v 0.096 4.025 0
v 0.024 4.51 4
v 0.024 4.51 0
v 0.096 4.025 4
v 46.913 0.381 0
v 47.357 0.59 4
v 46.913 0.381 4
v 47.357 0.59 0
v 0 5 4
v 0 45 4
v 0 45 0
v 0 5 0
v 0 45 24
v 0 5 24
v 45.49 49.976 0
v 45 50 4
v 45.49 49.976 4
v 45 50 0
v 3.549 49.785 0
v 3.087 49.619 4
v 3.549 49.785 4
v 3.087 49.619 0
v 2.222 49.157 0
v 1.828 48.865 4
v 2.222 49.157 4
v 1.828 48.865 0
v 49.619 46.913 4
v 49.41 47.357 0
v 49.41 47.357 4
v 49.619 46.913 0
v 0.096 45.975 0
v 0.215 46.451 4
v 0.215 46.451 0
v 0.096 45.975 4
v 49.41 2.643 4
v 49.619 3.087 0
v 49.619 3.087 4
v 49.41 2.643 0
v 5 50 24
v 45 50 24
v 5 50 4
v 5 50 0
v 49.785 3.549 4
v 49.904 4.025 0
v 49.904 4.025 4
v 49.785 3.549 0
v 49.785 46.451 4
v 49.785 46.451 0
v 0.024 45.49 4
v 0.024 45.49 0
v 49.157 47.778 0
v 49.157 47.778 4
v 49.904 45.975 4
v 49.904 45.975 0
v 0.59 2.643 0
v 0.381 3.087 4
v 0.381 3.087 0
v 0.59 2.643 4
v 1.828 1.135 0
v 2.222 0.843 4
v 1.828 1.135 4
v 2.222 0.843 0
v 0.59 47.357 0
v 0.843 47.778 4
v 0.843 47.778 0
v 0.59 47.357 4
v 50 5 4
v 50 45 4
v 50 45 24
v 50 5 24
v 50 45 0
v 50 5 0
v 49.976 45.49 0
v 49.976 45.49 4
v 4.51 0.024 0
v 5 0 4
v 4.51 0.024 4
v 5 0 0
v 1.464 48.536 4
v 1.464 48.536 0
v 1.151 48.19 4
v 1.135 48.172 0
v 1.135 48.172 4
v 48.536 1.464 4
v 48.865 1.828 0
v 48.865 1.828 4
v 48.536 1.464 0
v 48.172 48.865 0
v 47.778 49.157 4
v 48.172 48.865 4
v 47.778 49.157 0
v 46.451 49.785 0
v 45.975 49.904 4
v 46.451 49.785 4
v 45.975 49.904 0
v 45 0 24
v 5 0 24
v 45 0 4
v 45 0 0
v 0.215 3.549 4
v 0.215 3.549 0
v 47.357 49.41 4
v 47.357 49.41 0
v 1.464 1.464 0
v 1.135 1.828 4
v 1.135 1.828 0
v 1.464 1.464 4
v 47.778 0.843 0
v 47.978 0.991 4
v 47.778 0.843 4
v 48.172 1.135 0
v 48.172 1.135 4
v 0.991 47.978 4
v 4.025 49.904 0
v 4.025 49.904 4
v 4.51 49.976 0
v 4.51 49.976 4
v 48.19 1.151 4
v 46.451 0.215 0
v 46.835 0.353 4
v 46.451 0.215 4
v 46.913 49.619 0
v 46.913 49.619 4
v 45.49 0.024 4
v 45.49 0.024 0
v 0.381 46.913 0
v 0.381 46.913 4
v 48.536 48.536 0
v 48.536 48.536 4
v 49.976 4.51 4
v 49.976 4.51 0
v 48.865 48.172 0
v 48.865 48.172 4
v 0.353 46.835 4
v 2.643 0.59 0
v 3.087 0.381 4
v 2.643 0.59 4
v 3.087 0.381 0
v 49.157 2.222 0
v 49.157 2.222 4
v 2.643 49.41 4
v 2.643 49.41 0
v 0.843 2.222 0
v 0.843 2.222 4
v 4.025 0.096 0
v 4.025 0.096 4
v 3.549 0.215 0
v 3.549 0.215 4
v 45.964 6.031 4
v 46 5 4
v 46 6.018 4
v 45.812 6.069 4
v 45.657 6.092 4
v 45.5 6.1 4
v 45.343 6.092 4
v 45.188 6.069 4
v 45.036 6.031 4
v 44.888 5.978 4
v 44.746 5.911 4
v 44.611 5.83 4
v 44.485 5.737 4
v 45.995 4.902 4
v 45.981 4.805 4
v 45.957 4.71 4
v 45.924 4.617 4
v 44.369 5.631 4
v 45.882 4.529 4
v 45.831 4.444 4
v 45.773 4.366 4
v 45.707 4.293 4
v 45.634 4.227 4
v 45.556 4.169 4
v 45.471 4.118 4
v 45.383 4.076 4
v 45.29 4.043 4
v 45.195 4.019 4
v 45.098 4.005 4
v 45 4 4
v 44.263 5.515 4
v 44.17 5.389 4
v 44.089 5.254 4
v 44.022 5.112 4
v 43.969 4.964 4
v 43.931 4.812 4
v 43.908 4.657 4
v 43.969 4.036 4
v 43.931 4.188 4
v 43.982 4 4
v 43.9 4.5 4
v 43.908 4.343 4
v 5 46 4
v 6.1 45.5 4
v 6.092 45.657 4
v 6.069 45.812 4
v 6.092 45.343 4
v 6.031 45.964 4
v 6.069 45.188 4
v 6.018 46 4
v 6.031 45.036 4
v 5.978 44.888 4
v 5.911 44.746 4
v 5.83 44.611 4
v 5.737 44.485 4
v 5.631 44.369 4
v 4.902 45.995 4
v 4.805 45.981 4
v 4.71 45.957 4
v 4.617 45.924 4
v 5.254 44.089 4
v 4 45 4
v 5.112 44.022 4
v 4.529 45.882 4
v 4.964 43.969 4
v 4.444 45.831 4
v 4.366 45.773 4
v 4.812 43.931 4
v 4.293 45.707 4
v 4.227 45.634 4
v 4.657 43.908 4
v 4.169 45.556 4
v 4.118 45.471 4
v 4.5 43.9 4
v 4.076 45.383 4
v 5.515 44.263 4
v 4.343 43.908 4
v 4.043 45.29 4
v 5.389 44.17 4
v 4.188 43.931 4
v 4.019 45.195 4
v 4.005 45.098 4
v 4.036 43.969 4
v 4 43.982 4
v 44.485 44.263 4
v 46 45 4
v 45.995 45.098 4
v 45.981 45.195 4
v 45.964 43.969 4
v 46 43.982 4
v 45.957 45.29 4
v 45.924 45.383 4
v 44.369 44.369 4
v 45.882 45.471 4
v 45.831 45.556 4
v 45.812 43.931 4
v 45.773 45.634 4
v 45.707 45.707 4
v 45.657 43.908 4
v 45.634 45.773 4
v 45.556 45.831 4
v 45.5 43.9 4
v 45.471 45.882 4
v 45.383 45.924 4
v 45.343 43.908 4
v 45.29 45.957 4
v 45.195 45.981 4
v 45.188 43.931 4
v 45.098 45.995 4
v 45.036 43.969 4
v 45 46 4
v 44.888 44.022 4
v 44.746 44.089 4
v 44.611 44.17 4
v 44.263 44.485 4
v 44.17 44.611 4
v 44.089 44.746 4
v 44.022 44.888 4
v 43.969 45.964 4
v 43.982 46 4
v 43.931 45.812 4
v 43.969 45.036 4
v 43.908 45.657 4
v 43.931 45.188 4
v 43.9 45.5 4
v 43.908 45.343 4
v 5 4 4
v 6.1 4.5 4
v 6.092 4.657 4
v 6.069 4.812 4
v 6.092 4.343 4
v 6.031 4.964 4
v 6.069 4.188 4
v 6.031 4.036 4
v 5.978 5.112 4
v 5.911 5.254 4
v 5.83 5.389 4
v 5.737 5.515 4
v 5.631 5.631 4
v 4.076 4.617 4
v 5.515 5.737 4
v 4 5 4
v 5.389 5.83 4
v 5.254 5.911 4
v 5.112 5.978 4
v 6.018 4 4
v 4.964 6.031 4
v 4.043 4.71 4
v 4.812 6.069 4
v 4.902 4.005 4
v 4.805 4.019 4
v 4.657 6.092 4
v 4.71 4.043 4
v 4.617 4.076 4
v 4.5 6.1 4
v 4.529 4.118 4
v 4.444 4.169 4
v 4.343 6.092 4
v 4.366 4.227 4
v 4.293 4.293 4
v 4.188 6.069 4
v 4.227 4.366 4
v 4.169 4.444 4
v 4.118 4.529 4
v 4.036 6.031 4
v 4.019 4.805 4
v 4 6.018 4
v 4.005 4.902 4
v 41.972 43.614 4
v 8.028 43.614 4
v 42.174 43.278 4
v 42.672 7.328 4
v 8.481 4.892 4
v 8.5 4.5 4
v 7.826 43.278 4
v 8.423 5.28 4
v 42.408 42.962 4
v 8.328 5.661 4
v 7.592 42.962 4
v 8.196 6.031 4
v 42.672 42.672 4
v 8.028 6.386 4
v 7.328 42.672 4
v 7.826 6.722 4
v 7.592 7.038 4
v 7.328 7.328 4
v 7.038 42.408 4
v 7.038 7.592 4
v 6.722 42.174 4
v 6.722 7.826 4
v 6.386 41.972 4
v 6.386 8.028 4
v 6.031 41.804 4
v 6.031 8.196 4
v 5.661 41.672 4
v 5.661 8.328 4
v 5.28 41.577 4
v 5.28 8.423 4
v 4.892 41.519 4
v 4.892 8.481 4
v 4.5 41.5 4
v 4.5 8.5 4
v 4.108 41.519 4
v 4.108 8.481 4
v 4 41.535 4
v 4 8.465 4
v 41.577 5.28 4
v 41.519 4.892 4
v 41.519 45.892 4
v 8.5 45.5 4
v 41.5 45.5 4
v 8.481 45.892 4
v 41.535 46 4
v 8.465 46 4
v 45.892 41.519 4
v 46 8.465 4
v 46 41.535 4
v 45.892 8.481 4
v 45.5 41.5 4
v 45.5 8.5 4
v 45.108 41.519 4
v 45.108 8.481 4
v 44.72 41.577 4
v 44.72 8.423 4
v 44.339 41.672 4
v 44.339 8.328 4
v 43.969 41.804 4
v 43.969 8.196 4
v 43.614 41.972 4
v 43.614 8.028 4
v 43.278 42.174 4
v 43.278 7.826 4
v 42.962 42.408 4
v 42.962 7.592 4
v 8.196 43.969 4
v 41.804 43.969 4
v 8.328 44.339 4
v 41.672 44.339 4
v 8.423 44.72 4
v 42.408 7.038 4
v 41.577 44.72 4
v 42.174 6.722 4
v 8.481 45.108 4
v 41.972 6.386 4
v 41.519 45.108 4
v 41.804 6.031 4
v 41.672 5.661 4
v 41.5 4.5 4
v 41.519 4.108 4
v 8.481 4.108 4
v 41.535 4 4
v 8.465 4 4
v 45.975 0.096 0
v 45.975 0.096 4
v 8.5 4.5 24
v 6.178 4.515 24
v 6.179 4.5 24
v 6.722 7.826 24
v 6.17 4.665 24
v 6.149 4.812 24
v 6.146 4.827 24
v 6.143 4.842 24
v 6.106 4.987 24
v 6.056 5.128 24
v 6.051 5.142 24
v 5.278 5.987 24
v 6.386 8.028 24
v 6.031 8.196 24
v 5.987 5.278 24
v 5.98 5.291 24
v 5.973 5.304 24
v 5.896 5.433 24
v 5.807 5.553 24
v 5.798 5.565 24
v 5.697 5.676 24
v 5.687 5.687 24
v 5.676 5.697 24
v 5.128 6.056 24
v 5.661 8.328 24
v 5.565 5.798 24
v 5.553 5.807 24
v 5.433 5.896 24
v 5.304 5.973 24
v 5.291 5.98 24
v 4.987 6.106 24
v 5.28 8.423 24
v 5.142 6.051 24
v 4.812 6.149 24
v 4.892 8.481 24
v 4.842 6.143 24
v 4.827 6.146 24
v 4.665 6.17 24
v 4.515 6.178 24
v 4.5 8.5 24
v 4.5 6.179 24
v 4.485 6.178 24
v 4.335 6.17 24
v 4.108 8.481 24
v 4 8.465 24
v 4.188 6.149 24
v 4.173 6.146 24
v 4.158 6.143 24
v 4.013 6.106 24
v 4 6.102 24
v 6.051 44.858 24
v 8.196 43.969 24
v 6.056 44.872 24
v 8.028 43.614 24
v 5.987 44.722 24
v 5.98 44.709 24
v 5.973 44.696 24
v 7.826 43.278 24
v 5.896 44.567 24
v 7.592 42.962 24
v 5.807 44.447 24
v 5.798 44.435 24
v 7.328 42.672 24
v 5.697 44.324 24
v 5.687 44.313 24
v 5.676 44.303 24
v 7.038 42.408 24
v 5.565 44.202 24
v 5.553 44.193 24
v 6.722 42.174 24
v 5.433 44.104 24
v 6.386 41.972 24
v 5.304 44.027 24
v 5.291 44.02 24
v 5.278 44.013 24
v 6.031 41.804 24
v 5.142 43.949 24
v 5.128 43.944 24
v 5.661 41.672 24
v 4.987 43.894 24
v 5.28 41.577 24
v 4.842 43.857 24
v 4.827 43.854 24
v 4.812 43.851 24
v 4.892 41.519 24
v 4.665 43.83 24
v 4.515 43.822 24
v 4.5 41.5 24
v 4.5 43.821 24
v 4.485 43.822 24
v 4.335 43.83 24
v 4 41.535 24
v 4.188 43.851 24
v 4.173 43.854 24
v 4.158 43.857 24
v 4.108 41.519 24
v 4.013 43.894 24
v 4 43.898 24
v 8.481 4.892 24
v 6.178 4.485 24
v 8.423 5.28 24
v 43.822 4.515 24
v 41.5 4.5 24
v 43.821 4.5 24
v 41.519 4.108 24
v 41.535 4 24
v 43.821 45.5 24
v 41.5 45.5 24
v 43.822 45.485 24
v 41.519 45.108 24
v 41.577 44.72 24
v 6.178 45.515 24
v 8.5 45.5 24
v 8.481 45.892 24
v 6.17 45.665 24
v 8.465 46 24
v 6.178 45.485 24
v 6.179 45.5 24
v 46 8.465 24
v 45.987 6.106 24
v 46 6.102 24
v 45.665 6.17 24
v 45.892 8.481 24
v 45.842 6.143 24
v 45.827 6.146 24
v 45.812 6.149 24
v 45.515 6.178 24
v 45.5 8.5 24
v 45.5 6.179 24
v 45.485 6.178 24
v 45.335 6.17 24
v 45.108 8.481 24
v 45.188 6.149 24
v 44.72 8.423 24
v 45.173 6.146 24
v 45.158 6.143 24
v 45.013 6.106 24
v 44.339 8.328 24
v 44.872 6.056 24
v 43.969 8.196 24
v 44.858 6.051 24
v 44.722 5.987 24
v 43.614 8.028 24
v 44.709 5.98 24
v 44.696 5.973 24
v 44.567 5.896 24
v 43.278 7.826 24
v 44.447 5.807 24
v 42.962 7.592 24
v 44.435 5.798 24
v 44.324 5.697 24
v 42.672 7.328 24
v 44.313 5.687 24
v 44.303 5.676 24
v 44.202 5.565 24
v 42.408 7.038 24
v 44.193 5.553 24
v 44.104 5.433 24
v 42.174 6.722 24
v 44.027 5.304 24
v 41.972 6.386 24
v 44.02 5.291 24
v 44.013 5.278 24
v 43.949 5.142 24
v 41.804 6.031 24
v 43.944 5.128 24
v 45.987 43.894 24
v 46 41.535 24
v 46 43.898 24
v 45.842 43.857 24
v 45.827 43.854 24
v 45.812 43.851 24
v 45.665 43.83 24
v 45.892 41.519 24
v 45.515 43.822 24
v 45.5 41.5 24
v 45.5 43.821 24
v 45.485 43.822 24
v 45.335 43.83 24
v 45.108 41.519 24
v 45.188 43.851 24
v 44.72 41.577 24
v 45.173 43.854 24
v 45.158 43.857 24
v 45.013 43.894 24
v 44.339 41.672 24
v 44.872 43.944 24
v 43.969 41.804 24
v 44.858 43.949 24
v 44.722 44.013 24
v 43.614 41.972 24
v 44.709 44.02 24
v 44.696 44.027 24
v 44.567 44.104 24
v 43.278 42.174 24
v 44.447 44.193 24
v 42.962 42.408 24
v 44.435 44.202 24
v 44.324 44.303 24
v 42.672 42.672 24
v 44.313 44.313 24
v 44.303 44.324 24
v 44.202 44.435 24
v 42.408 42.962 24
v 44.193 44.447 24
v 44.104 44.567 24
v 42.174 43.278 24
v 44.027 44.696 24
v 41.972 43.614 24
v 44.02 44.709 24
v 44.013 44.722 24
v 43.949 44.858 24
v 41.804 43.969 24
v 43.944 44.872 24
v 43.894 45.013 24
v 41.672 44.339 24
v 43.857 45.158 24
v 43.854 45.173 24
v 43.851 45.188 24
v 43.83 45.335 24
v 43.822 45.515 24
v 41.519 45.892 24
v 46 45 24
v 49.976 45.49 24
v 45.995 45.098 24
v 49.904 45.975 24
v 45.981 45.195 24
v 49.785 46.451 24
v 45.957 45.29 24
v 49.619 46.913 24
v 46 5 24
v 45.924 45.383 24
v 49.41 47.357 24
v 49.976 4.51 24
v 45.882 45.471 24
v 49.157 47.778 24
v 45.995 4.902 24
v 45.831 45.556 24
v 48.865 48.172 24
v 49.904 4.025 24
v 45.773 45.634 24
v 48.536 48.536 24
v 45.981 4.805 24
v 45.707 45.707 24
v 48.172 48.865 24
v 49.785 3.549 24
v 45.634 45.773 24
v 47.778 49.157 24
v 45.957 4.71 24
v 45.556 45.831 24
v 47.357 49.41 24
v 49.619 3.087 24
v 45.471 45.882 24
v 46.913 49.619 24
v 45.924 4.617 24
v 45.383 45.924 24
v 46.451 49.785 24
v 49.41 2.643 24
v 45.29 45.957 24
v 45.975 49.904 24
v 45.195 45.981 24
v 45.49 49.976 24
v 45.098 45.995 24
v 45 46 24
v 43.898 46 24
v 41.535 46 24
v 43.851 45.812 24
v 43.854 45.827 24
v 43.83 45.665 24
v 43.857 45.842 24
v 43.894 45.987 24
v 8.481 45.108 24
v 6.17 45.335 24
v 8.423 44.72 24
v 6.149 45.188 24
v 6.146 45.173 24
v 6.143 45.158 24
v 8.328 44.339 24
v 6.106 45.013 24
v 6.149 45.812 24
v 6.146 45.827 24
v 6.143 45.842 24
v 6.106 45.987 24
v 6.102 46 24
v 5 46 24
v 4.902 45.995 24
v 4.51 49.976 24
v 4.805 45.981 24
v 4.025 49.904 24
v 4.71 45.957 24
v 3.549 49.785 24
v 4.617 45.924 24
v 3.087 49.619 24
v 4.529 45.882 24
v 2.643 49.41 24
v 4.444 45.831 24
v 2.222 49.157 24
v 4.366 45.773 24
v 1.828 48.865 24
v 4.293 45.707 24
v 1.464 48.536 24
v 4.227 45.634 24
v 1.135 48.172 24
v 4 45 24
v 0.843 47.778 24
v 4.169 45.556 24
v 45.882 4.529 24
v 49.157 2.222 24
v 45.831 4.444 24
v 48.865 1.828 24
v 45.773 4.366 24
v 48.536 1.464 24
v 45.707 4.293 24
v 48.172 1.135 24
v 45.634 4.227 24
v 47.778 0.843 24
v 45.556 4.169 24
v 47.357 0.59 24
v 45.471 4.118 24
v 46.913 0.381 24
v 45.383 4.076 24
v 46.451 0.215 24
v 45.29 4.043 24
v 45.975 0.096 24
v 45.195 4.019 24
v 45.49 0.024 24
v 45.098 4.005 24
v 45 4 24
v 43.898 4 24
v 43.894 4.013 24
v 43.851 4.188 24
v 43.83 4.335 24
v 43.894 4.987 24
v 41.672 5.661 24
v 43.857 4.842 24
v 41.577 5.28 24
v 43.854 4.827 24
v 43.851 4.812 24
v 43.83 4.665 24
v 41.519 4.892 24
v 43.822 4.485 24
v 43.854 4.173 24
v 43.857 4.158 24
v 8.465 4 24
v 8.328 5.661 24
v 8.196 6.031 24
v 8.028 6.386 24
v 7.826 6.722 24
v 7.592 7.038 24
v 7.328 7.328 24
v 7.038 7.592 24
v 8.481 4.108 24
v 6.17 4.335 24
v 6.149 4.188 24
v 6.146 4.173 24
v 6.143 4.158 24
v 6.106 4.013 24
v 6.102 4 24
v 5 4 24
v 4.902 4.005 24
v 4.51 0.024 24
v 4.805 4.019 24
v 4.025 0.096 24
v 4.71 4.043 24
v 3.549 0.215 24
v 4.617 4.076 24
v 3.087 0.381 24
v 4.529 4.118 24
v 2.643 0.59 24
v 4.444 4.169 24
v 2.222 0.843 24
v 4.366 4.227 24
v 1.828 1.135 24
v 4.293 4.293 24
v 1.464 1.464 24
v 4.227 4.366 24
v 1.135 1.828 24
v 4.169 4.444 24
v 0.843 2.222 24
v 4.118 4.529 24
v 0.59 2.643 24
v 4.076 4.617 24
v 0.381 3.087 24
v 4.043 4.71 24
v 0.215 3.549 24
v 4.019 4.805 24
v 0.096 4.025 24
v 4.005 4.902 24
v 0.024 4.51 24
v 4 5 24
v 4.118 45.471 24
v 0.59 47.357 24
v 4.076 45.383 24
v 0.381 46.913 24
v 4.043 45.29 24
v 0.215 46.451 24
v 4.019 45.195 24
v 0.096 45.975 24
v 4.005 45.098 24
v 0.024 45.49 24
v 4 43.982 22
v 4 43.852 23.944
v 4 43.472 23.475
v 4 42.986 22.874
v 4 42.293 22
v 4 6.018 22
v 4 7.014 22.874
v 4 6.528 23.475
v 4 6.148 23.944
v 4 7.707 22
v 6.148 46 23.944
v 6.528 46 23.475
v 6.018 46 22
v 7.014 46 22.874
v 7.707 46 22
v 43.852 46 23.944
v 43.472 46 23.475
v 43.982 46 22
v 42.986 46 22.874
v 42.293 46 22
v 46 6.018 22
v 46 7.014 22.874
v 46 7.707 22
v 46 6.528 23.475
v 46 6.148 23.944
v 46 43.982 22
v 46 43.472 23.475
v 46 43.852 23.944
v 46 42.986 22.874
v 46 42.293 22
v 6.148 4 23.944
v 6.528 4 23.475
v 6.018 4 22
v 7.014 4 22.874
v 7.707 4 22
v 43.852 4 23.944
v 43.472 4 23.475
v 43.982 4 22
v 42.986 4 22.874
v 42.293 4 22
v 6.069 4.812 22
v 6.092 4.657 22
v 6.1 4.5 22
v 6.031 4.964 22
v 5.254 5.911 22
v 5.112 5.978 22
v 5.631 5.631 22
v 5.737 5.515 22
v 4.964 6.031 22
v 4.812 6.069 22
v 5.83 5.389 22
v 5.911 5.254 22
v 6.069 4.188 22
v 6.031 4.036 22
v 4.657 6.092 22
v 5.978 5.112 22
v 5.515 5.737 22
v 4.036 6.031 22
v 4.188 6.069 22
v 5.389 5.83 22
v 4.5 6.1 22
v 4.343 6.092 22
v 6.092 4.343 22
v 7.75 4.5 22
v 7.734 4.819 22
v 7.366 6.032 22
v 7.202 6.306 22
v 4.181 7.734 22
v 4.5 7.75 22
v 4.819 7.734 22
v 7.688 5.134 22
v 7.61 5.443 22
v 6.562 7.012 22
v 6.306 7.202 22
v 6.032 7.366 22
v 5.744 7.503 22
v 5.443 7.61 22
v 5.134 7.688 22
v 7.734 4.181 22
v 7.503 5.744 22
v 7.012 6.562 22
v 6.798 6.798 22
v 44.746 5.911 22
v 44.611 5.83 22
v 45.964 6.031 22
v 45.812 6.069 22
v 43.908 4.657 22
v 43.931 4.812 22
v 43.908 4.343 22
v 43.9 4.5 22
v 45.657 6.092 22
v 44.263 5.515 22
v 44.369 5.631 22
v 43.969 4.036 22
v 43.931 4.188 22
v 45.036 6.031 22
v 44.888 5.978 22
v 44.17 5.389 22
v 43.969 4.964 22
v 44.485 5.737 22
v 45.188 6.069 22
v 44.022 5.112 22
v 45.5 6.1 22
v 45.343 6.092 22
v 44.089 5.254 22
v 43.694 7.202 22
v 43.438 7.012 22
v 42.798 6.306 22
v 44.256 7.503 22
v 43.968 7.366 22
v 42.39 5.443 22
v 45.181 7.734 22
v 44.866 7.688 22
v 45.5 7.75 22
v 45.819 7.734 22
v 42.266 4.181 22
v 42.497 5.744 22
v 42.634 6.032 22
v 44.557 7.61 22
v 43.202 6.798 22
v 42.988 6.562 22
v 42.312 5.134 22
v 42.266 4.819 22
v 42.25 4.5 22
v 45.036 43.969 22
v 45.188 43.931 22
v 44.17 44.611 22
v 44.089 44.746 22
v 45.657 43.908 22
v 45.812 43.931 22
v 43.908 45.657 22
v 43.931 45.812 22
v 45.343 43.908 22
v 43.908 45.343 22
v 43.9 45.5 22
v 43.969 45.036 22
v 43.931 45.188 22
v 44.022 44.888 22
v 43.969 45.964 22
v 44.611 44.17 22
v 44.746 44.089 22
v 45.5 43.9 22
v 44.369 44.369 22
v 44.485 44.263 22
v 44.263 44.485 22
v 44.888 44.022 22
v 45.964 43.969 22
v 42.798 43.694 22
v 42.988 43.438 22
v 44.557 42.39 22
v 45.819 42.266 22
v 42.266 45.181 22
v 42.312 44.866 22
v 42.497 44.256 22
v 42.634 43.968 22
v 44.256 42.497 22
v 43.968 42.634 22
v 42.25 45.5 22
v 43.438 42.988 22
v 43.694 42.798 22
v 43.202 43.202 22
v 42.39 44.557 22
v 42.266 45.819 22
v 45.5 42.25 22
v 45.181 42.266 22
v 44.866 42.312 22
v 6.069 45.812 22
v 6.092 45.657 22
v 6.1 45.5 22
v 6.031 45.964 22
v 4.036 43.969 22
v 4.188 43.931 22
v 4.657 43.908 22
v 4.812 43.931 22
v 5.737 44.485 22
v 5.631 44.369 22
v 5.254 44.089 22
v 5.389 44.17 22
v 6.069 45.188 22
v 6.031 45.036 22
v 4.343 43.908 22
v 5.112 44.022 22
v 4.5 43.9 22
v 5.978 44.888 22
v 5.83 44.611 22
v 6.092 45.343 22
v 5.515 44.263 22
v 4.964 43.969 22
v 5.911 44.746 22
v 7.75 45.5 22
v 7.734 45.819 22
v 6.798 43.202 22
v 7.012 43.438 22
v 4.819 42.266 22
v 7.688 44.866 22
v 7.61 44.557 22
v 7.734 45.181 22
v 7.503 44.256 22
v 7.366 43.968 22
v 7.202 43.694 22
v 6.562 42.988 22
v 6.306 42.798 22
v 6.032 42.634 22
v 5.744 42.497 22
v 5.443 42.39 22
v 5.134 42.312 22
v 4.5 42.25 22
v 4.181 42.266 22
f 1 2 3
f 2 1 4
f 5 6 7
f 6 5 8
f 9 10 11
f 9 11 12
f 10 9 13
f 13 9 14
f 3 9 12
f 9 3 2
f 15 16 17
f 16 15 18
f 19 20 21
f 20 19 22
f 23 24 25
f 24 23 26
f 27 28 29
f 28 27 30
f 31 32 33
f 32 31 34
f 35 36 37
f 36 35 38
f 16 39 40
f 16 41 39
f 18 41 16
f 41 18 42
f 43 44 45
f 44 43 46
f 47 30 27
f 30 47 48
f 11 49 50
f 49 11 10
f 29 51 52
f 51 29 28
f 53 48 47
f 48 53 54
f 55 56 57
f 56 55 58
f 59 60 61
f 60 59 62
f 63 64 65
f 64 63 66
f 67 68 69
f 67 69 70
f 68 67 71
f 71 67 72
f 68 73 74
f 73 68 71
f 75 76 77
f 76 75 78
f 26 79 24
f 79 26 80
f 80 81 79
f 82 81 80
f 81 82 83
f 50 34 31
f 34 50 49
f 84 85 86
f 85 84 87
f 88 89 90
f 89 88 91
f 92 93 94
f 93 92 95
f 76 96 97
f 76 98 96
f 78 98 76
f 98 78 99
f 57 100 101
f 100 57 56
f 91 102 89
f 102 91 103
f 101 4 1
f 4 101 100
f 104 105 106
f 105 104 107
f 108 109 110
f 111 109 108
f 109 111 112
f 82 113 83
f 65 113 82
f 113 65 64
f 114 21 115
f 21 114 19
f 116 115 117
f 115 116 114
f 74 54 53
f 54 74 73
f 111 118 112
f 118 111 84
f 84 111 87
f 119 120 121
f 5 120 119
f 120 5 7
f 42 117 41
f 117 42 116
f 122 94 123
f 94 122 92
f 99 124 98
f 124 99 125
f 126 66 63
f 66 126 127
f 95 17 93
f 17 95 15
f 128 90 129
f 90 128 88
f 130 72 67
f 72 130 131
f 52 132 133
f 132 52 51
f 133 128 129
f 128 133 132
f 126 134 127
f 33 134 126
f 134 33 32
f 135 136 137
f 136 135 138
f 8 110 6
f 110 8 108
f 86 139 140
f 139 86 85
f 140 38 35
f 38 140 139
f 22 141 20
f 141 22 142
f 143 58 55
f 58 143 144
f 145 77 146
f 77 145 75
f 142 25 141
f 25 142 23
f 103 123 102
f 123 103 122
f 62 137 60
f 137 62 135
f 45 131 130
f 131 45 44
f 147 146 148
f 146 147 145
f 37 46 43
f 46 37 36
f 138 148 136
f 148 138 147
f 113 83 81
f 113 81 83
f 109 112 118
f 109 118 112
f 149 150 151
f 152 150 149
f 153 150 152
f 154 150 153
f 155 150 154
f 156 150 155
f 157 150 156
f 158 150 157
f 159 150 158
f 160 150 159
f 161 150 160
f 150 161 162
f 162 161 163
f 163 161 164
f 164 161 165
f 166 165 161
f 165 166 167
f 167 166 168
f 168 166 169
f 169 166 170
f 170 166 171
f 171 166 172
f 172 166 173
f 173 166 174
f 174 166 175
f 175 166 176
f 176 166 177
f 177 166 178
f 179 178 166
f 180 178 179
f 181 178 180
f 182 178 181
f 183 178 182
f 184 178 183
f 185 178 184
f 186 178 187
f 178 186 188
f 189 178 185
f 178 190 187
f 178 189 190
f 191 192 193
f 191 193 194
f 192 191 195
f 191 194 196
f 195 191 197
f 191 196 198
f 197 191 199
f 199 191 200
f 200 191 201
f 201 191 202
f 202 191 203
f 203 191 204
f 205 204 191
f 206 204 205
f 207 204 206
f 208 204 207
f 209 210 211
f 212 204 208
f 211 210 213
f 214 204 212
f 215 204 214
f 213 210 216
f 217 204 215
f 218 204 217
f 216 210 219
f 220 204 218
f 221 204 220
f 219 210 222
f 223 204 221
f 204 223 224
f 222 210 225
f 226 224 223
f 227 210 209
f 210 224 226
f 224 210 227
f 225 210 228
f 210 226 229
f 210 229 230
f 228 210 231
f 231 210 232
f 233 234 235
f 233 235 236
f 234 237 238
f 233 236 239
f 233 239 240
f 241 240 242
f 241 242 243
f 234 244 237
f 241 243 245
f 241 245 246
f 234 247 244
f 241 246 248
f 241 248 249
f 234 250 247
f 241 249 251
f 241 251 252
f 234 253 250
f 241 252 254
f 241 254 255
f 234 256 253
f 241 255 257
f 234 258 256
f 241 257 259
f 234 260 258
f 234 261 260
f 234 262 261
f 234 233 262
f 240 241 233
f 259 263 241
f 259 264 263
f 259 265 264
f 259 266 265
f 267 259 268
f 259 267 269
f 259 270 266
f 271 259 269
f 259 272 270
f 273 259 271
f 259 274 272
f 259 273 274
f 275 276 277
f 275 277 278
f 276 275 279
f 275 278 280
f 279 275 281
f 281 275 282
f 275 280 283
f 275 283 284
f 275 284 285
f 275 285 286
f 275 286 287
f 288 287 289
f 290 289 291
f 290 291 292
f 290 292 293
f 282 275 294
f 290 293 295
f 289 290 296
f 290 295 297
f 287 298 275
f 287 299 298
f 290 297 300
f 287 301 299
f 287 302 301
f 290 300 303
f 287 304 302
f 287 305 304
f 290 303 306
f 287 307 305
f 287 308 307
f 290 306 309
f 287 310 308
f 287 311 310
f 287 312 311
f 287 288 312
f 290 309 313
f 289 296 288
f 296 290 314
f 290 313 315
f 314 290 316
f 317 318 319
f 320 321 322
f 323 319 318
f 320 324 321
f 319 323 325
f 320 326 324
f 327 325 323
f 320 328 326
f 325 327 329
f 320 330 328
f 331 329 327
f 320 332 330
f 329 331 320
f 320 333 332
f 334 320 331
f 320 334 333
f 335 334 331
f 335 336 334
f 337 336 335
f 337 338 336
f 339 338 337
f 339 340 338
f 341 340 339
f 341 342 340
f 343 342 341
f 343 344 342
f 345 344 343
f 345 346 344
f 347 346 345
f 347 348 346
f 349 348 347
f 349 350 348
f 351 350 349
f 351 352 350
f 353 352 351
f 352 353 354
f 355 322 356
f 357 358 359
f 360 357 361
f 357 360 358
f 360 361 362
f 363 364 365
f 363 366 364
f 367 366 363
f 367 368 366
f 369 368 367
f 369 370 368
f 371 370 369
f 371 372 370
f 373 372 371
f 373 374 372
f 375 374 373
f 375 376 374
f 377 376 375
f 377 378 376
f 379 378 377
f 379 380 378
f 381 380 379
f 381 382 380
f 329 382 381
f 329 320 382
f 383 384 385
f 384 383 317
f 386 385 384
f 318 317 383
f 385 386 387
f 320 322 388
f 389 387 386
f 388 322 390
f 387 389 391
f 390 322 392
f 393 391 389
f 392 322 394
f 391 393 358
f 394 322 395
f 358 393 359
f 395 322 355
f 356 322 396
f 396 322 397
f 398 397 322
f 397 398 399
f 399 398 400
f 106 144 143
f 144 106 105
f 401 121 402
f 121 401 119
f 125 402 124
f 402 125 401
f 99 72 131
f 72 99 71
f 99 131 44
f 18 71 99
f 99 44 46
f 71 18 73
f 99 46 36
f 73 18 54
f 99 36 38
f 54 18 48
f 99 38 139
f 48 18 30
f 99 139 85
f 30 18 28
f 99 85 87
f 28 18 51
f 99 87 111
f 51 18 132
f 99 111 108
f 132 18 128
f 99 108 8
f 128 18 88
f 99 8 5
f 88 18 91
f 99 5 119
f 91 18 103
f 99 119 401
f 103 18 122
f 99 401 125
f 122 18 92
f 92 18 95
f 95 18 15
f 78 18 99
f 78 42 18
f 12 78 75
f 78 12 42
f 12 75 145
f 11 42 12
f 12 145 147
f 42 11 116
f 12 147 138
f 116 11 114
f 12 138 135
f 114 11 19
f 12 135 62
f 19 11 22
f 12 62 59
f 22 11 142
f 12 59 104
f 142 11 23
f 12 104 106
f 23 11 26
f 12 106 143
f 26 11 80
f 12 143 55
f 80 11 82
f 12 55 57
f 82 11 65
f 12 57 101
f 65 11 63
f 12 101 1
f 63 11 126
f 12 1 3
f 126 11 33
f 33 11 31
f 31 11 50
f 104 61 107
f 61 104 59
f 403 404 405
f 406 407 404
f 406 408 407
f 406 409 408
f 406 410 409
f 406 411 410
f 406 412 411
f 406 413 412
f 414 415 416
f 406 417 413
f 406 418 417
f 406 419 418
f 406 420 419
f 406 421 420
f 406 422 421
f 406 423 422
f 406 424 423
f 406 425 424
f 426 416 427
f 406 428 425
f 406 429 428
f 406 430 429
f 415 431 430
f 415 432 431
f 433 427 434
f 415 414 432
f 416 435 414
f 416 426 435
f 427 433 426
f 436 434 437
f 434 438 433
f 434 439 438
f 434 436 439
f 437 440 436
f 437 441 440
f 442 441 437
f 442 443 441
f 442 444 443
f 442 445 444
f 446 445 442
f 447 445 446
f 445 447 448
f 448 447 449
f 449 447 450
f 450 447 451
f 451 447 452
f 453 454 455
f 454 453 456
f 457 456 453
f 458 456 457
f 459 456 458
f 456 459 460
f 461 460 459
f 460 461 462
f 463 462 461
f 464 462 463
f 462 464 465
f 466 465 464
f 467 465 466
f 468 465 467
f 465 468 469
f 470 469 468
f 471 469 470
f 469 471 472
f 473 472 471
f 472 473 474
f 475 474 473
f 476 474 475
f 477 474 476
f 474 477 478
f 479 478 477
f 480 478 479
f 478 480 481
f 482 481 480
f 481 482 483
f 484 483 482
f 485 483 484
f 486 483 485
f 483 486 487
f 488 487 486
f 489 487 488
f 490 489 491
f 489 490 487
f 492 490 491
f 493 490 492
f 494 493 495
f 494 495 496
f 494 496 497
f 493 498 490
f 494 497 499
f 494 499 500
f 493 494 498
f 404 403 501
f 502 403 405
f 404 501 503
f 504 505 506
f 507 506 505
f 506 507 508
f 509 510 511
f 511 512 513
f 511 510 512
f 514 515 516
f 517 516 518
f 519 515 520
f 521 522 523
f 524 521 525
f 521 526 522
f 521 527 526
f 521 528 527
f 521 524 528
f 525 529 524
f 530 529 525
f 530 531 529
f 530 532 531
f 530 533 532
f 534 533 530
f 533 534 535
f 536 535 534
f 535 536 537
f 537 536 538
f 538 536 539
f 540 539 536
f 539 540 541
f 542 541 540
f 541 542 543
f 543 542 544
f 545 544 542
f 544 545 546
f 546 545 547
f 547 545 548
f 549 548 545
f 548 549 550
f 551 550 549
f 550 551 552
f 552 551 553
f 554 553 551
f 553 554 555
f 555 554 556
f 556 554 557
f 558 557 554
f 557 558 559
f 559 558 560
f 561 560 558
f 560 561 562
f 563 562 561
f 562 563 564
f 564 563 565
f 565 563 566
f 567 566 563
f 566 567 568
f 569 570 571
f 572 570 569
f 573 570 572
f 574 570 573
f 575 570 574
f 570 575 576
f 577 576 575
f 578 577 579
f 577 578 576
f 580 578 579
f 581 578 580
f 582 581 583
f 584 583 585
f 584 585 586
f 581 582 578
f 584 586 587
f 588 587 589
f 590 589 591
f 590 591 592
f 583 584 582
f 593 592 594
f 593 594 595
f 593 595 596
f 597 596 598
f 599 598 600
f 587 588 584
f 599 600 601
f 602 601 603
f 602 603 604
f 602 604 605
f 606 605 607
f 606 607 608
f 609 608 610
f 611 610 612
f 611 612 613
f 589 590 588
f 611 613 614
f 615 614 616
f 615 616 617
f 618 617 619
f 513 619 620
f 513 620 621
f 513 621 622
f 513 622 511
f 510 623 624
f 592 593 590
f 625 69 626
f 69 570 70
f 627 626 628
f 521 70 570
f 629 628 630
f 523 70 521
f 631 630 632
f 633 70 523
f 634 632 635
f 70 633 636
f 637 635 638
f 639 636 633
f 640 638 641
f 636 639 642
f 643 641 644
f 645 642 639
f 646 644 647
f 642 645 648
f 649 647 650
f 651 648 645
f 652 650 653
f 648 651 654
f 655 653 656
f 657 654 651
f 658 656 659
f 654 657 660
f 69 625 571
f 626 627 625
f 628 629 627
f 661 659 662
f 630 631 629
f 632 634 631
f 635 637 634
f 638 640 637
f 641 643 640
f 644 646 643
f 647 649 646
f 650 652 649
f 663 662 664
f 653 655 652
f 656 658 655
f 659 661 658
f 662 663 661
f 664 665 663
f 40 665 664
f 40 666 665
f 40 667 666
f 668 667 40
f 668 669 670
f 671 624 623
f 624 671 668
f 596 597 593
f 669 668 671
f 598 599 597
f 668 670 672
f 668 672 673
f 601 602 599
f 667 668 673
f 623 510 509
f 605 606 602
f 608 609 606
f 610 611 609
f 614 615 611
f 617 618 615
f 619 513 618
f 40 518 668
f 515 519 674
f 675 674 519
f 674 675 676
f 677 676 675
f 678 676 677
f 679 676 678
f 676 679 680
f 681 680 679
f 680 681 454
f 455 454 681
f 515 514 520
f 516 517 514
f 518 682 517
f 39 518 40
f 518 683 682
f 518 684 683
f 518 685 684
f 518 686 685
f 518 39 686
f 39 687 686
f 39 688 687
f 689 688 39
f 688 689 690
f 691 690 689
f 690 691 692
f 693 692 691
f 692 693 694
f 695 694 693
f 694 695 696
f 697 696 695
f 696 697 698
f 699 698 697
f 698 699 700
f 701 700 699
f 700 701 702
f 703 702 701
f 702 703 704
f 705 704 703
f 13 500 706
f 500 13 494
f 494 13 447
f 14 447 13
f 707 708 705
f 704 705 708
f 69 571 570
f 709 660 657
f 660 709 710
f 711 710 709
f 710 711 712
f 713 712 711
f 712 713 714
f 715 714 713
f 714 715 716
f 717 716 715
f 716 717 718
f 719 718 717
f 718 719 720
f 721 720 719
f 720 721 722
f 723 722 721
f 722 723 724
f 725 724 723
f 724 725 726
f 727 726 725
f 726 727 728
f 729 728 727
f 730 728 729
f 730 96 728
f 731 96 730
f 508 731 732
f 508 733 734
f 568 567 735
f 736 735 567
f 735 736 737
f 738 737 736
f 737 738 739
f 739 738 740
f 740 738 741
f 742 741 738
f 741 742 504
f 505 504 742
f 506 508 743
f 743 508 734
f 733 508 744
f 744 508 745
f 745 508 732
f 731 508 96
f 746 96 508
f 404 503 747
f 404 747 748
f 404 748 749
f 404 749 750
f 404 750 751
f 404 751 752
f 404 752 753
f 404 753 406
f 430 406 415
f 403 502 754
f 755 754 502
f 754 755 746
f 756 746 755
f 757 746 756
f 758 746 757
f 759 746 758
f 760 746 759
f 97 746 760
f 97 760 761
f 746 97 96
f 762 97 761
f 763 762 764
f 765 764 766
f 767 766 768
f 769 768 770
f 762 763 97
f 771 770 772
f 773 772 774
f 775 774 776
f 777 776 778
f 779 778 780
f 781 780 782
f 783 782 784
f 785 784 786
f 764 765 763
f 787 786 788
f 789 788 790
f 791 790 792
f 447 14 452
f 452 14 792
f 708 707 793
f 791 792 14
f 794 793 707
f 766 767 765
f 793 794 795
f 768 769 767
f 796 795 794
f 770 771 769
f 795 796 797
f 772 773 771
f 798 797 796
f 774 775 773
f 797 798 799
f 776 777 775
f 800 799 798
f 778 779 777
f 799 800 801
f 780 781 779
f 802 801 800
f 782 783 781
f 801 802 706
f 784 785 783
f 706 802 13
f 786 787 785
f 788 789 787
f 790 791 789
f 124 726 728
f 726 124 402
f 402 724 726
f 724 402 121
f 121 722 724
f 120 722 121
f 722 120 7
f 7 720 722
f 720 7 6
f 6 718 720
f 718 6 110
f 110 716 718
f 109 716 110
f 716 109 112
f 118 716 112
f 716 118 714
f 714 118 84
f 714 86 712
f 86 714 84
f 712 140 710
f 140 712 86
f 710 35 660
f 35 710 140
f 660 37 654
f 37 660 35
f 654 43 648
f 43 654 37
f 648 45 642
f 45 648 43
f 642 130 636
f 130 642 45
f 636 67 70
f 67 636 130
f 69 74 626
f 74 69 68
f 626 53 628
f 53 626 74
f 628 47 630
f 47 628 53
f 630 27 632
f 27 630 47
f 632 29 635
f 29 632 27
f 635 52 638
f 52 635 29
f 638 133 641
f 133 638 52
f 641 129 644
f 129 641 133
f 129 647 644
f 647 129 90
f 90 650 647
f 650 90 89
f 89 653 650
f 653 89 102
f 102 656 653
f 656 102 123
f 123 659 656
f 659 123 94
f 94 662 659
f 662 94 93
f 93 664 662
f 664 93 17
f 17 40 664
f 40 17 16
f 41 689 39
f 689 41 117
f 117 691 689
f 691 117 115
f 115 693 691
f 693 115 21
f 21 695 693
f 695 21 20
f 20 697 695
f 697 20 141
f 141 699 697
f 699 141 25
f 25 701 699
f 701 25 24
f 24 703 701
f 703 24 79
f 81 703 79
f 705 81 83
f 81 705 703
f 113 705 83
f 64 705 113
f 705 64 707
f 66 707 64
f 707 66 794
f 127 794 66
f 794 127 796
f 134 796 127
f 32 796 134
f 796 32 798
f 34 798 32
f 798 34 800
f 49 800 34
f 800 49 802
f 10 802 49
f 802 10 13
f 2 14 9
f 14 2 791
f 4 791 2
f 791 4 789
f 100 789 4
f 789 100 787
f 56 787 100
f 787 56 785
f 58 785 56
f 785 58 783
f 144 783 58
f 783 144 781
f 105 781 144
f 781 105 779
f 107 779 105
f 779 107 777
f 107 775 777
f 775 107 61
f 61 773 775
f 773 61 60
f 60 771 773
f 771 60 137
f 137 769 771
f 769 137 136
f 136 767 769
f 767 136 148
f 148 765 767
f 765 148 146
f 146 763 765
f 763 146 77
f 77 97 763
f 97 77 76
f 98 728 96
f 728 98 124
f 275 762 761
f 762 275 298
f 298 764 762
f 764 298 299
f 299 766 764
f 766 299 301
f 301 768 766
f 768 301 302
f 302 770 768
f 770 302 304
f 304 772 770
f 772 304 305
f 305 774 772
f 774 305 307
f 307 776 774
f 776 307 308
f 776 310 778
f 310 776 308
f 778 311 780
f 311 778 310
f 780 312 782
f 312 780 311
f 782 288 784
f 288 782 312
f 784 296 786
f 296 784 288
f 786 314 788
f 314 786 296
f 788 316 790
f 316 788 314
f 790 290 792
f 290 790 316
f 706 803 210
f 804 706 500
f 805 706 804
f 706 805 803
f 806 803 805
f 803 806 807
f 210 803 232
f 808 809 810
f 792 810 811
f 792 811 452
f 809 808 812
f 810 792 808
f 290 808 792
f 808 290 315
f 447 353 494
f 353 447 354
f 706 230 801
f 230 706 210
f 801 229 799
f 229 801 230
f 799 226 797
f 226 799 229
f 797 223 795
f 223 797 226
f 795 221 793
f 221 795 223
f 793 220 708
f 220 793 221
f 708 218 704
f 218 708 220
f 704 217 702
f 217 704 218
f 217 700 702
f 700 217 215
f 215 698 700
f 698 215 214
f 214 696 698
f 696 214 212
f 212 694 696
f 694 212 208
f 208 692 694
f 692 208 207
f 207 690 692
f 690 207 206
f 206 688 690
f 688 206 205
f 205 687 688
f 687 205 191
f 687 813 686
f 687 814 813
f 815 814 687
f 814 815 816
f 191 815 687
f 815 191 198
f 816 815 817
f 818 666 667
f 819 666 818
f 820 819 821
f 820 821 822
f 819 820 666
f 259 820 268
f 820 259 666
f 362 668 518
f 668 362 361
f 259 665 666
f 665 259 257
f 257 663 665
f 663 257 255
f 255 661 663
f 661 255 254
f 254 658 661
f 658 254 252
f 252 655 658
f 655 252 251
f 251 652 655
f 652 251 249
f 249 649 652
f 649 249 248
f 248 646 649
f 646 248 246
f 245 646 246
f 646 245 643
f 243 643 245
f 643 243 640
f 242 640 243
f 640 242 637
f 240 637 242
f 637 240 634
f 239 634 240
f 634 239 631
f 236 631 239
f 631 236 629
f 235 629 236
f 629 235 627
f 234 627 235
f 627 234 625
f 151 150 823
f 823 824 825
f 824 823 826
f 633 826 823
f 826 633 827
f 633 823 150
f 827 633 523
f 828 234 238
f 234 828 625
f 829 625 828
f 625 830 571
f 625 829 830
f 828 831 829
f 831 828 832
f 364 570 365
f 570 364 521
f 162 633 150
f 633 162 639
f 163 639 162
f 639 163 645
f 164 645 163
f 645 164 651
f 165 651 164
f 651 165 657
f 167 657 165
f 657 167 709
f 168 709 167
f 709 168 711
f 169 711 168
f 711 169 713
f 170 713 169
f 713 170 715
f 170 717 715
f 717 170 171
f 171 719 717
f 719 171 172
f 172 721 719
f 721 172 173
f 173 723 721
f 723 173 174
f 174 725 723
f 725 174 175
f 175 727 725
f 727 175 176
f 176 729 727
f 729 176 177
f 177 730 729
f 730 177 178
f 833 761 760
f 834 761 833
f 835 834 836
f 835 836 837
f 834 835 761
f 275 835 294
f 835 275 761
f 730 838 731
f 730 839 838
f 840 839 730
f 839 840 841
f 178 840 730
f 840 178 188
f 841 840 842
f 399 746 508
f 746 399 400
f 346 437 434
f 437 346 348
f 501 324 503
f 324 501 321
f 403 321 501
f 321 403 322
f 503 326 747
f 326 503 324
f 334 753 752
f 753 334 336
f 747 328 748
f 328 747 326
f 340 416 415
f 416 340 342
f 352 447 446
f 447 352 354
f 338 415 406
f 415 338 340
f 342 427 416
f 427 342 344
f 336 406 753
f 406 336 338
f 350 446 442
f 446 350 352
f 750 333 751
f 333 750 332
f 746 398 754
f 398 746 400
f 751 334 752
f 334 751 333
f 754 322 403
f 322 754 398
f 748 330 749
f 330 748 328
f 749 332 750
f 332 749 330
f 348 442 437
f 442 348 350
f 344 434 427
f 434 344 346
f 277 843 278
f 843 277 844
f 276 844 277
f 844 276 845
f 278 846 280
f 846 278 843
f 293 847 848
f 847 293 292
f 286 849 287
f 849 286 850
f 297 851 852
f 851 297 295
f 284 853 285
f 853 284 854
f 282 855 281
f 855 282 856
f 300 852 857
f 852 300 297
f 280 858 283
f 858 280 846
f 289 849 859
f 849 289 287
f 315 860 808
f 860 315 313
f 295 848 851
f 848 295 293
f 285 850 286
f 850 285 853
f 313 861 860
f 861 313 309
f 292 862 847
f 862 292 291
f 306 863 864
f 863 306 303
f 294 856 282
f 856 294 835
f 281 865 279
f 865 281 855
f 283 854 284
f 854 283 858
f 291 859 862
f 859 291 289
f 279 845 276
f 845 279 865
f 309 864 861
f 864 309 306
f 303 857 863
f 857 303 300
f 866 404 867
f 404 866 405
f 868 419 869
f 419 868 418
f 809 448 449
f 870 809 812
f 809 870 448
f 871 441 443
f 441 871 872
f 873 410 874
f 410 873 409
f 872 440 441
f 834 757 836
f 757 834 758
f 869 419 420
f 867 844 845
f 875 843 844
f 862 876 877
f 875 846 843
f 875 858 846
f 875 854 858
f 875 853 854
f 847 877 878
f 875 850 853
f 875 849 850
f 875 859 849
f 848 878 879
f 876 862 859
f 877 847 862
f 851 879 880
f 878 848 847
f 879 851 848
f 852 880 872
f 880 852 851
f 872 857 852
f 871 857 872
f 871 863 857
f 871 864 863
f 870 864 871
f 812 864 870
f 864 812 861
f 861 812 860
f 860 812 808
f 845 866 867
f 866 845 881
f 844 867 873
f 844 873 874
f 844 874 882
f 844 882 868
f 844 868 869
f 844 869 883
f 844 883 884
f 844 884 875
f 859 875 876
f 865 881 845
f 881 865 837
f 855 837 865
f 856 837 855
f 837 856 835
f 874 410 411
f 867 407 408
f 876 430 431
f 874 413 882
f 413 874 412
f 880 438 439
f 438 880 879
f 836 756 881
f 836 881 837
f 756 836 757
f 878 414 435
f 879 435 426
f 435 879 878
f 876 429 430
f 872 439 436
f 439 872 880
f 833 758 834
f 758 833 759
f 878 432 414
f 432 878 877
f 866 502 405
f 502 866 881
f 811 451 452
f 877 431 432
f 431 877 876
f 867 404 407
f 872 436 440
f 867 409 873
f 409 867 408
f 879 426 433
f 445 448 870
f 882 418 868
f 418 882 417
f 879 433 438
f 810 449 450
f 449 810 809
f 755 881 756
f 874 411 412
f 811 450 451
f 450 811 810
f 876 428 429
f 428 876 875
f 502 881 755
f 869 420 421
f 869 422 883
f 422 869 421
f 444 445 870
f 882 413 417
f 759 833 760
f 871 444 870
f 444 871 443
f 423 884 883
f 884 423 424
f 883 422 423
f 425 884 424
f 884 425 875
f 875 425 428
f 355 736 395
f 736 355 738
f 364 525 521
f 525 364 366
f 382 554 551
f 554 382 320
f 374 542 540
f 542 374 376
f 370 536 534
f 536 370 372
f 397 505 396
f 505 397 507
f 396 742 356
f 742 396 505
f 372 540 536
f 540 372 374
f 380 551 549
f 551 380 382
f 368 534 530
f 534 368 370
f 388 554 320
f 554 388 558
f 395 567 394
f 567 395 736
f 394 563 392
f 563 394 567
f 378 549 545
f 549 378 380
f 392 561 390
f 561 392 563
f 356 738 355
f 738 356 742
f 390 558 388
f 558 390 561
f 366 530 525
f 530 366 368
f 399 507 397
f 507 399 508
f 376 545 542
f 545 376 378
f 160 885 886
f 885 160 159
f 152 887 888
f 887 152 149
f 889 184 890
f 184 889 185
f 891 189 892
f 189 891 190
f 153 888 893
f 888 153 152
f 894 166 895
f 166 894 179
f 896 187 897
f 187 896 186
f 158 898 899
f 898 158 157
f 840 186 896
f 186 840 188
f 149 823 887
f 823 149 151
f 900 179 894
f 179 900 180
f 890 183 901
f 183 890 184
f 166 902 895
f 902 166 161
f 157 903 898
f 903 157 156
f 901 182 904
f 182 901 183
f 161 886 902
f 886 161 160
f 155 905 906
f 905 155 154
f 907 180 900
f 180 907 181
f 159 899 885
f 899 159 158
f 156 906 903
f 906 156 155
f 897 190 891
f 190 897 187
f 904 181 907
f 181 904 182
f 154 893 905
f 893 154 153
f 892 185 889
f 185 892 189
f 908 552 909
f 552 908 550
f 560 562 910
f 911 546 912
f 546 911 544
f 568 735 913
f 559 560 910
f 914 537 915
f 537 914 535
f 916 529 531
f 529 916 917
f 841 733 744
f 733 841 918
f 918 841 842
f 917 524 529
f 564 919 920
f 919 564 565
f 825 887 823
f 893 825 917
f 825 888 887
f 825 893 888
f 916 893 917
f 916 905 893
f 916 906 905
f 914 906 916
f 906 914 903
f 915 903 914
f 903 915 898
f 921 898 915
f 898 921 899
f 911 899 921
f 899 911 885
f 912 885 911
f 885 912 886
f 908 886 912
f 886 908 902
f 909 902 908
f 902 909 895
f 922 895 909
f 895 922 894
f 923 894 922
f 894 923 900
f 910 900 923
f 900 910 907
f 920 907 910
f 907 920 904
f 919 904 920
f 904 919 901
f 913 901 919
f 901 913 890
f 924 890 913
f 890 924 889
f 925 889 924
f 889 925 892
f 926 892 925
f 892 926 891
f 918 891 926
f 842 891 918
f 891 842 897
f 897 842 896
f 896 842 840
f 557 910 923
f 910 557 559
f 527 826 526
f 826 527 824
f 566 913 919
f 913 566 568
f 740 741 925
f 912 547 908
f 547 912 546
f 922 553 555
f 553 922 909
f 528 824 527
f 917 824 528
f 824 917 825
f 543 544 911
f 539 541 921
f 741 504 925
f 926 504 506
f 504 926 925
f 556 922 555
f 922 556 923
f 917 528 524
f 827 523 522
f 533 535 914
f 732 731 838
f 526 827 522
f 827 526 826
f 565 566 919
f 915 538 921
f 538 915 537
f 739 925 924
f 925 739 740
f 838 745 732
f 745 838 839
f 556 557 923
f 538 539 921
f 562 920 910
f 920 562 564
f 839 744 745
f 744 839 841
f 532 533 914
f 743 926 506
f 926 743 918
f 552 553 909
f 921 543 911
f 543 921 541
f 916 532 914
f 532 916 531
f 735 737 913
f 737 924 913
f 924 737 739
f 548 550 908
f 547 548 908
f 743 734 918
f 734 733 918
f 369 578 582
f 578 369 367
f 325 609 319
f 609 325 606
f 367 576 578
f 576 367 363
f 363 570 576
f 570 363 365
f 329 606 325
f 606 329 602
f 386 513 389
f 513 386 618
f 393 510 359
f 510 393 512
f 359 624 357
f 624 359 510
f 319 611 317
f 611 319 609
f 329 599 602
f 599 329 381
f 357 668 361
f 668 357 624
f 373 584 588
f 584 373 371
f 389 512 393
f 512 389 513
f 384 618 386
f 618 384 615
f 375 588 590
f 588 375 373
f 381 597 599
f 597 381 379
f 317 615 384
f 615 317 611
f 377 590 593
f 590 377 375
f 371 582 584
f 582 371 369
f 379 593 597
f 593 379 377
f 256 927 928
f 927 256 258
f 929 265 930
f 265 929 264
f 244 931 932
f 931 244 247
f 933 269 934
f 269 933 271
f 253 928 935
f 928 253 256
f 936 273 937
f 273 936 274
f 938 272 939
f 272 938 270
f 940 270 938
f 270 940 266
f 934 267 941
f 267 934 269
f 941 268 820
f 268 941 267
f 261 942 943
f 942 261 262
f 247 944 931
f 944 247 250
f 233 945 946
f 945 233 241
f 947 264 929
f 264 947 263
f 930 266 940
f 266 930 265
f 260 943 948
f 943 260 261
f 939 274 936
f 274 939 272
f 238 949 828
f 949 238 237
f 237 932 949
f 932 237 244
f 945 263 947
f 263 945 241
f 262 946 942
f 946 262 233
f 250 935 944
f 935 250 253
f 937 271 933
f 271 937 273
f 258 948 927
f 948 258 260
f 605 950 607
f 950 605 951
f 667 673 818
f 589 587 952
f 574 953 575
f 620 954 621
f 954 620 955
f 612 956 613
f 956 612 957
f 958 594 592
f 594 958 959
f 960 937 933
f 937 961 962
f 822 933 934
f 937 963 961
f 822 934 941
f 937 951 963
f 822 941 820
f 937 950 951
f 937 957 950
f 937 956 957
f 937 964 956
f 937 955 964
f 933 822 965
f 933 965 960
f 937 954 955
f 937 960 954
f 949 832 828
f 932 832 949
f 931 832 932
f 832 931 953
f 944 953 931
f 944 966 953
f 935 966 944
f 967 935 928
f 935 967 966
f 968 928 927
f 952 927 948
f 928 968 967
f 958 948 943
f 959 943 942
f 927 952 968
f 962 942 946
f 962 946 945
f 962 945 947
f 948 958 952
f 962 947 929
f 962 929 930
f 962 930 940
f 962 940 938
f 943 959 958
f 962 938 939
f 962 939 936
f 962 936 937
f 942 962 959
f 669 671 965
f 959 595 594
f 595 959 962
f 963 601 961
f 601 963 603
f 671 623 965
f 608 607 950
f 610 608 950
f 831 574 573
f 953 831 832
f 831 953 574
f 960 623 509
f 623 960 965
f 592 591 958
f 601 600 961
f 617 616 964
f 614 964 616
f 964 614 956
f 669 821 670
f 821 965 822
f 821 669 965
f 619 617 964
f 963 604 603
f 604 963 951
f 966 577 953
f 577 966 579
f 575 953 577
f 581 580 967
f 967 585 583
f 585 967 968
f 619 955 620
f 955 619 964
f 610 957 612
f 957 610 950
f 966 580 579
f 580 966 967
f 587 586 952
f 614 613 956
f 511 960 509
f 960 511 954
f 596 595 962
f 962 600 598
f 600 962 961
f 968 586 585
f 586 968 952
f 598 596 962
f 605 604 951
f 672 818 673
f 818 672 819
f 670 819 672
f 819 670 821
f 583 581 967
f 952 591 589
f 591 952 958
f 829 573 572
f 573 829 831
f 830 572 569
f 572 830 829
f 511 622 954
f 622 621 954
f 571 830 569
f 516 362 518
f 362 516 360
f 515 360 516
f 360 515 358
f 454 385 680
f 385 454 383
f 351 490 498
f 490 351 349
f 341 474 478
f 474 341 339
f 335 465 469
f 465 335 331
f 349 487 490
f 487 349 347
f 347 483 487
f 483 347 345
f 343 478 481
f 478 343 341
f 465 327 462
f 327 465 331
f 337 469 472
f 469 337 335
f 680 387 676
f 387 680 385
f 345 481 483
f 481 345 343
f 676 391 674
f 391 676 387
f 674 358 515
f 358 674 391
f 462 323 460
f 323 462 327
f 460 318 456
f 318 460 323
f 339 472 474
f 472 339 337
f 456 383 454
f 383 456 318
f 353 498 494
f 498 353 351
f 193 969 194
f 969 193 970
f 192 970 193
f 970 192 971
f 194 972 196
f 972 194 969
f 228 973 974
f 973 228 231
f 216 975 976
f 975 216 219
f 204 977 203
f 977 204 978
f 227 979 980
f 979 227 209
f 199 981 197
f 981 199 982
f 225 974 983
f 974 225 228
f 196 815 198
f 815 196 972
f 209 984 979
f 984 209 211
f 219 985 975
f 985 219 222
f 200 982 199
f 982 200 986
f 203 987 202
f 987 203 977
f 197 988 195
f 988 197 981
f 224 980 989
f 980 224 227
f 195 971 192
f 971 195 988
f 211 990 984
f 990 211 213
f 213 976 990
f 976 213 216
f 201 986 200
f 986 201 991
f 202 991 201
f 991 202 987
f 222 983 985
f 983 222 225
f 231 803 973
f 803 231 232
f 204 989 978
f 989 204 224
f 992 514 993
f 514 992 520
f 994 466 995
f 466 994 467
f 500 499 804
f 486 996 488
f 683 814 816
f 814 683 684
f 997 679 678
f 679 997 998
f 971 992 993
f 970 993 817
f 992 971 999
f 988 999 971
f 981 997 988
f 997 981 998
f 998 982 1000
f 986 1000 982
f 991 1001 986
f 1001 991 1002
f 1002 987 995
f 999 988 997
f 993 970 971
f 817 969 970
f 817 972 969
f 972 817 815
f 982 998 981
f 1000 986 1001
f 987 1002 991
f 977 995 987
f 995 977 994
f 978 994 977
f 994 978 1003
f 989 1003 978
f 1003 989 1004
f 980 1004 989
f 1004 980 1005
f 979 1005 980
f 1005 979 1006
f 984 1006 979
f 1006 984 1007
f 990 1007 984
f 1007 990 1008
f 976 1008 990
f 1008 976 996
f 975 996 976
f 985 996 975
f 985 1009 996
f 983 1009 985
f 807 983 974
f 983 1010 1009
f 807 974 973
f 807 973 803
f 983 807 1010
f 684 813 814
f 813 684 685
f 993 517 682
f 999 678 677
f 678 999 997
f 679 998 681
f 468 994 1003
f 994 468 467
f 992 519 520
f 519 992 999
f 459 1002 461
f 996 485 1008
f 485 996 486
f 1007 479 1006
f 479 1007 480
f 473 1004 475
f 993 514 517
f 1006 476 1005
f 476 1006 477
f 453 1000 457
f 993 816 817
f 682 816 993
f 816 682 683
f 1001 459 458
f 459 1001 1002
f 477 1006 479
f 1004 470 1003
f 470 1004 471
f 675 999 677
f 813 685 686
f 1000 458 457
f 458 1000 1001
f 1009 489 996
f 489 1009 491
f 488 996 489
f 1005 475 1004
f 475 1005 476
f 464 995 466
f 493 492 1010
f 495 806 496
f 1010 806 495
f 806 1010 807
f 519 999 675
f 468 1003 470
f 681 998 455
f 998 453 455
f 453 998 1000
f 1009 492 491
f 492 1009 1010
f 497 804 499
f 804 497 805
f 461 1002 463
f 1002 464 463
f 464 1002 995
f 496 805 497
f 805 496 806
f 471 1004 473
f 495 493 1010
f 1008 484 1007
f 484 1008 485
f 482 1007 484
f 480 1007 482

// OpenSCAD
// ---------- PARAMETERS ----------
size_x = 50;
size_y = 50;
corner_r = 5;

base_thickness = 4;
wall_thickness = 4;
wall_height = 20;

// post + screw
post_d = 8;
hole_d = 3.2;     // M3 clearance
csk_d = 6.5;      // countersink diameter
csk_depth = 2;

// positioning
edge_margin = -3.5;   // distance from wall to post edge

$fn = 64;

// ---------- DERIVED ----------
post_r = post_d / 2;

// symmetric placement near corners
px1 = wall_thickness + post_r + edge_margin;
px2 = size_x - (wall_thickness + post_r + edge_margin);

py1 = wall_thickness + post_r + edge_margin;
py2 = size_y - (wall_thickness + post_r + edge_margin);

// ---------- MODULES ----------

// Rounded rectangle (2D)
module rounded_rect_2d(x, y, r) {
    r = min(r, min(x, y)/2);

    hull() {
        translate([r, r]) circle(r);
        translate([x - r, r]) circle(r);
        translate([x - r, y - r]) circle(r);
        translate([r, y - r]) circle(r);
    }
}

// Base + hollow walls
module enclosure_body() {
    union() {

        // base plate
        linear_extrude(base_thickness)
            rounded_rect_2d(size_x, size_y, corner_r);

        // walls
        translate([0, 0, base_thickness])
            linear_extrude(wall_height)
                difference() {

                    // outer
                    rounded_rect_2d(size_x, size_y, corner_r);

                    // inner cavity (correct offset)
                    translate([wall_thickness, wall_thickness])
                        rounded_rect_2d(
                            size_x - 2*wall_thickness,
                            size_y - 2*wall_thickness,
                            max(corner_r - wall_thickness, 0.01)
                        );
                }
    }
}

// Corner posts with holes
module corner_posts() {

    positions = [
        [px1, py1],
        [px2, py1],
        [px2, py2],
        [px1, py2]
    ];

    for (p = positions) {
        translate([p[0], p[1], base_thickness])
            difference() {

                // post body
                cylinder(h = wall_height, d = post_d);

                // through hole
                translate([0,0,-0.1])
                    cylinder(h = wall_height + 0.2, d = hole_d);

                // countersink (top side for lid screws)
                translate([0,0,wall_height - csk_depth])
                    cylinder(h = csk_depth + 0.1, d1 = csk_d, d2 = hole_d);
            }
    }
}

// ---------- FINAL ----------
union() {
    enclosure_body();
    corner_posts();
}
